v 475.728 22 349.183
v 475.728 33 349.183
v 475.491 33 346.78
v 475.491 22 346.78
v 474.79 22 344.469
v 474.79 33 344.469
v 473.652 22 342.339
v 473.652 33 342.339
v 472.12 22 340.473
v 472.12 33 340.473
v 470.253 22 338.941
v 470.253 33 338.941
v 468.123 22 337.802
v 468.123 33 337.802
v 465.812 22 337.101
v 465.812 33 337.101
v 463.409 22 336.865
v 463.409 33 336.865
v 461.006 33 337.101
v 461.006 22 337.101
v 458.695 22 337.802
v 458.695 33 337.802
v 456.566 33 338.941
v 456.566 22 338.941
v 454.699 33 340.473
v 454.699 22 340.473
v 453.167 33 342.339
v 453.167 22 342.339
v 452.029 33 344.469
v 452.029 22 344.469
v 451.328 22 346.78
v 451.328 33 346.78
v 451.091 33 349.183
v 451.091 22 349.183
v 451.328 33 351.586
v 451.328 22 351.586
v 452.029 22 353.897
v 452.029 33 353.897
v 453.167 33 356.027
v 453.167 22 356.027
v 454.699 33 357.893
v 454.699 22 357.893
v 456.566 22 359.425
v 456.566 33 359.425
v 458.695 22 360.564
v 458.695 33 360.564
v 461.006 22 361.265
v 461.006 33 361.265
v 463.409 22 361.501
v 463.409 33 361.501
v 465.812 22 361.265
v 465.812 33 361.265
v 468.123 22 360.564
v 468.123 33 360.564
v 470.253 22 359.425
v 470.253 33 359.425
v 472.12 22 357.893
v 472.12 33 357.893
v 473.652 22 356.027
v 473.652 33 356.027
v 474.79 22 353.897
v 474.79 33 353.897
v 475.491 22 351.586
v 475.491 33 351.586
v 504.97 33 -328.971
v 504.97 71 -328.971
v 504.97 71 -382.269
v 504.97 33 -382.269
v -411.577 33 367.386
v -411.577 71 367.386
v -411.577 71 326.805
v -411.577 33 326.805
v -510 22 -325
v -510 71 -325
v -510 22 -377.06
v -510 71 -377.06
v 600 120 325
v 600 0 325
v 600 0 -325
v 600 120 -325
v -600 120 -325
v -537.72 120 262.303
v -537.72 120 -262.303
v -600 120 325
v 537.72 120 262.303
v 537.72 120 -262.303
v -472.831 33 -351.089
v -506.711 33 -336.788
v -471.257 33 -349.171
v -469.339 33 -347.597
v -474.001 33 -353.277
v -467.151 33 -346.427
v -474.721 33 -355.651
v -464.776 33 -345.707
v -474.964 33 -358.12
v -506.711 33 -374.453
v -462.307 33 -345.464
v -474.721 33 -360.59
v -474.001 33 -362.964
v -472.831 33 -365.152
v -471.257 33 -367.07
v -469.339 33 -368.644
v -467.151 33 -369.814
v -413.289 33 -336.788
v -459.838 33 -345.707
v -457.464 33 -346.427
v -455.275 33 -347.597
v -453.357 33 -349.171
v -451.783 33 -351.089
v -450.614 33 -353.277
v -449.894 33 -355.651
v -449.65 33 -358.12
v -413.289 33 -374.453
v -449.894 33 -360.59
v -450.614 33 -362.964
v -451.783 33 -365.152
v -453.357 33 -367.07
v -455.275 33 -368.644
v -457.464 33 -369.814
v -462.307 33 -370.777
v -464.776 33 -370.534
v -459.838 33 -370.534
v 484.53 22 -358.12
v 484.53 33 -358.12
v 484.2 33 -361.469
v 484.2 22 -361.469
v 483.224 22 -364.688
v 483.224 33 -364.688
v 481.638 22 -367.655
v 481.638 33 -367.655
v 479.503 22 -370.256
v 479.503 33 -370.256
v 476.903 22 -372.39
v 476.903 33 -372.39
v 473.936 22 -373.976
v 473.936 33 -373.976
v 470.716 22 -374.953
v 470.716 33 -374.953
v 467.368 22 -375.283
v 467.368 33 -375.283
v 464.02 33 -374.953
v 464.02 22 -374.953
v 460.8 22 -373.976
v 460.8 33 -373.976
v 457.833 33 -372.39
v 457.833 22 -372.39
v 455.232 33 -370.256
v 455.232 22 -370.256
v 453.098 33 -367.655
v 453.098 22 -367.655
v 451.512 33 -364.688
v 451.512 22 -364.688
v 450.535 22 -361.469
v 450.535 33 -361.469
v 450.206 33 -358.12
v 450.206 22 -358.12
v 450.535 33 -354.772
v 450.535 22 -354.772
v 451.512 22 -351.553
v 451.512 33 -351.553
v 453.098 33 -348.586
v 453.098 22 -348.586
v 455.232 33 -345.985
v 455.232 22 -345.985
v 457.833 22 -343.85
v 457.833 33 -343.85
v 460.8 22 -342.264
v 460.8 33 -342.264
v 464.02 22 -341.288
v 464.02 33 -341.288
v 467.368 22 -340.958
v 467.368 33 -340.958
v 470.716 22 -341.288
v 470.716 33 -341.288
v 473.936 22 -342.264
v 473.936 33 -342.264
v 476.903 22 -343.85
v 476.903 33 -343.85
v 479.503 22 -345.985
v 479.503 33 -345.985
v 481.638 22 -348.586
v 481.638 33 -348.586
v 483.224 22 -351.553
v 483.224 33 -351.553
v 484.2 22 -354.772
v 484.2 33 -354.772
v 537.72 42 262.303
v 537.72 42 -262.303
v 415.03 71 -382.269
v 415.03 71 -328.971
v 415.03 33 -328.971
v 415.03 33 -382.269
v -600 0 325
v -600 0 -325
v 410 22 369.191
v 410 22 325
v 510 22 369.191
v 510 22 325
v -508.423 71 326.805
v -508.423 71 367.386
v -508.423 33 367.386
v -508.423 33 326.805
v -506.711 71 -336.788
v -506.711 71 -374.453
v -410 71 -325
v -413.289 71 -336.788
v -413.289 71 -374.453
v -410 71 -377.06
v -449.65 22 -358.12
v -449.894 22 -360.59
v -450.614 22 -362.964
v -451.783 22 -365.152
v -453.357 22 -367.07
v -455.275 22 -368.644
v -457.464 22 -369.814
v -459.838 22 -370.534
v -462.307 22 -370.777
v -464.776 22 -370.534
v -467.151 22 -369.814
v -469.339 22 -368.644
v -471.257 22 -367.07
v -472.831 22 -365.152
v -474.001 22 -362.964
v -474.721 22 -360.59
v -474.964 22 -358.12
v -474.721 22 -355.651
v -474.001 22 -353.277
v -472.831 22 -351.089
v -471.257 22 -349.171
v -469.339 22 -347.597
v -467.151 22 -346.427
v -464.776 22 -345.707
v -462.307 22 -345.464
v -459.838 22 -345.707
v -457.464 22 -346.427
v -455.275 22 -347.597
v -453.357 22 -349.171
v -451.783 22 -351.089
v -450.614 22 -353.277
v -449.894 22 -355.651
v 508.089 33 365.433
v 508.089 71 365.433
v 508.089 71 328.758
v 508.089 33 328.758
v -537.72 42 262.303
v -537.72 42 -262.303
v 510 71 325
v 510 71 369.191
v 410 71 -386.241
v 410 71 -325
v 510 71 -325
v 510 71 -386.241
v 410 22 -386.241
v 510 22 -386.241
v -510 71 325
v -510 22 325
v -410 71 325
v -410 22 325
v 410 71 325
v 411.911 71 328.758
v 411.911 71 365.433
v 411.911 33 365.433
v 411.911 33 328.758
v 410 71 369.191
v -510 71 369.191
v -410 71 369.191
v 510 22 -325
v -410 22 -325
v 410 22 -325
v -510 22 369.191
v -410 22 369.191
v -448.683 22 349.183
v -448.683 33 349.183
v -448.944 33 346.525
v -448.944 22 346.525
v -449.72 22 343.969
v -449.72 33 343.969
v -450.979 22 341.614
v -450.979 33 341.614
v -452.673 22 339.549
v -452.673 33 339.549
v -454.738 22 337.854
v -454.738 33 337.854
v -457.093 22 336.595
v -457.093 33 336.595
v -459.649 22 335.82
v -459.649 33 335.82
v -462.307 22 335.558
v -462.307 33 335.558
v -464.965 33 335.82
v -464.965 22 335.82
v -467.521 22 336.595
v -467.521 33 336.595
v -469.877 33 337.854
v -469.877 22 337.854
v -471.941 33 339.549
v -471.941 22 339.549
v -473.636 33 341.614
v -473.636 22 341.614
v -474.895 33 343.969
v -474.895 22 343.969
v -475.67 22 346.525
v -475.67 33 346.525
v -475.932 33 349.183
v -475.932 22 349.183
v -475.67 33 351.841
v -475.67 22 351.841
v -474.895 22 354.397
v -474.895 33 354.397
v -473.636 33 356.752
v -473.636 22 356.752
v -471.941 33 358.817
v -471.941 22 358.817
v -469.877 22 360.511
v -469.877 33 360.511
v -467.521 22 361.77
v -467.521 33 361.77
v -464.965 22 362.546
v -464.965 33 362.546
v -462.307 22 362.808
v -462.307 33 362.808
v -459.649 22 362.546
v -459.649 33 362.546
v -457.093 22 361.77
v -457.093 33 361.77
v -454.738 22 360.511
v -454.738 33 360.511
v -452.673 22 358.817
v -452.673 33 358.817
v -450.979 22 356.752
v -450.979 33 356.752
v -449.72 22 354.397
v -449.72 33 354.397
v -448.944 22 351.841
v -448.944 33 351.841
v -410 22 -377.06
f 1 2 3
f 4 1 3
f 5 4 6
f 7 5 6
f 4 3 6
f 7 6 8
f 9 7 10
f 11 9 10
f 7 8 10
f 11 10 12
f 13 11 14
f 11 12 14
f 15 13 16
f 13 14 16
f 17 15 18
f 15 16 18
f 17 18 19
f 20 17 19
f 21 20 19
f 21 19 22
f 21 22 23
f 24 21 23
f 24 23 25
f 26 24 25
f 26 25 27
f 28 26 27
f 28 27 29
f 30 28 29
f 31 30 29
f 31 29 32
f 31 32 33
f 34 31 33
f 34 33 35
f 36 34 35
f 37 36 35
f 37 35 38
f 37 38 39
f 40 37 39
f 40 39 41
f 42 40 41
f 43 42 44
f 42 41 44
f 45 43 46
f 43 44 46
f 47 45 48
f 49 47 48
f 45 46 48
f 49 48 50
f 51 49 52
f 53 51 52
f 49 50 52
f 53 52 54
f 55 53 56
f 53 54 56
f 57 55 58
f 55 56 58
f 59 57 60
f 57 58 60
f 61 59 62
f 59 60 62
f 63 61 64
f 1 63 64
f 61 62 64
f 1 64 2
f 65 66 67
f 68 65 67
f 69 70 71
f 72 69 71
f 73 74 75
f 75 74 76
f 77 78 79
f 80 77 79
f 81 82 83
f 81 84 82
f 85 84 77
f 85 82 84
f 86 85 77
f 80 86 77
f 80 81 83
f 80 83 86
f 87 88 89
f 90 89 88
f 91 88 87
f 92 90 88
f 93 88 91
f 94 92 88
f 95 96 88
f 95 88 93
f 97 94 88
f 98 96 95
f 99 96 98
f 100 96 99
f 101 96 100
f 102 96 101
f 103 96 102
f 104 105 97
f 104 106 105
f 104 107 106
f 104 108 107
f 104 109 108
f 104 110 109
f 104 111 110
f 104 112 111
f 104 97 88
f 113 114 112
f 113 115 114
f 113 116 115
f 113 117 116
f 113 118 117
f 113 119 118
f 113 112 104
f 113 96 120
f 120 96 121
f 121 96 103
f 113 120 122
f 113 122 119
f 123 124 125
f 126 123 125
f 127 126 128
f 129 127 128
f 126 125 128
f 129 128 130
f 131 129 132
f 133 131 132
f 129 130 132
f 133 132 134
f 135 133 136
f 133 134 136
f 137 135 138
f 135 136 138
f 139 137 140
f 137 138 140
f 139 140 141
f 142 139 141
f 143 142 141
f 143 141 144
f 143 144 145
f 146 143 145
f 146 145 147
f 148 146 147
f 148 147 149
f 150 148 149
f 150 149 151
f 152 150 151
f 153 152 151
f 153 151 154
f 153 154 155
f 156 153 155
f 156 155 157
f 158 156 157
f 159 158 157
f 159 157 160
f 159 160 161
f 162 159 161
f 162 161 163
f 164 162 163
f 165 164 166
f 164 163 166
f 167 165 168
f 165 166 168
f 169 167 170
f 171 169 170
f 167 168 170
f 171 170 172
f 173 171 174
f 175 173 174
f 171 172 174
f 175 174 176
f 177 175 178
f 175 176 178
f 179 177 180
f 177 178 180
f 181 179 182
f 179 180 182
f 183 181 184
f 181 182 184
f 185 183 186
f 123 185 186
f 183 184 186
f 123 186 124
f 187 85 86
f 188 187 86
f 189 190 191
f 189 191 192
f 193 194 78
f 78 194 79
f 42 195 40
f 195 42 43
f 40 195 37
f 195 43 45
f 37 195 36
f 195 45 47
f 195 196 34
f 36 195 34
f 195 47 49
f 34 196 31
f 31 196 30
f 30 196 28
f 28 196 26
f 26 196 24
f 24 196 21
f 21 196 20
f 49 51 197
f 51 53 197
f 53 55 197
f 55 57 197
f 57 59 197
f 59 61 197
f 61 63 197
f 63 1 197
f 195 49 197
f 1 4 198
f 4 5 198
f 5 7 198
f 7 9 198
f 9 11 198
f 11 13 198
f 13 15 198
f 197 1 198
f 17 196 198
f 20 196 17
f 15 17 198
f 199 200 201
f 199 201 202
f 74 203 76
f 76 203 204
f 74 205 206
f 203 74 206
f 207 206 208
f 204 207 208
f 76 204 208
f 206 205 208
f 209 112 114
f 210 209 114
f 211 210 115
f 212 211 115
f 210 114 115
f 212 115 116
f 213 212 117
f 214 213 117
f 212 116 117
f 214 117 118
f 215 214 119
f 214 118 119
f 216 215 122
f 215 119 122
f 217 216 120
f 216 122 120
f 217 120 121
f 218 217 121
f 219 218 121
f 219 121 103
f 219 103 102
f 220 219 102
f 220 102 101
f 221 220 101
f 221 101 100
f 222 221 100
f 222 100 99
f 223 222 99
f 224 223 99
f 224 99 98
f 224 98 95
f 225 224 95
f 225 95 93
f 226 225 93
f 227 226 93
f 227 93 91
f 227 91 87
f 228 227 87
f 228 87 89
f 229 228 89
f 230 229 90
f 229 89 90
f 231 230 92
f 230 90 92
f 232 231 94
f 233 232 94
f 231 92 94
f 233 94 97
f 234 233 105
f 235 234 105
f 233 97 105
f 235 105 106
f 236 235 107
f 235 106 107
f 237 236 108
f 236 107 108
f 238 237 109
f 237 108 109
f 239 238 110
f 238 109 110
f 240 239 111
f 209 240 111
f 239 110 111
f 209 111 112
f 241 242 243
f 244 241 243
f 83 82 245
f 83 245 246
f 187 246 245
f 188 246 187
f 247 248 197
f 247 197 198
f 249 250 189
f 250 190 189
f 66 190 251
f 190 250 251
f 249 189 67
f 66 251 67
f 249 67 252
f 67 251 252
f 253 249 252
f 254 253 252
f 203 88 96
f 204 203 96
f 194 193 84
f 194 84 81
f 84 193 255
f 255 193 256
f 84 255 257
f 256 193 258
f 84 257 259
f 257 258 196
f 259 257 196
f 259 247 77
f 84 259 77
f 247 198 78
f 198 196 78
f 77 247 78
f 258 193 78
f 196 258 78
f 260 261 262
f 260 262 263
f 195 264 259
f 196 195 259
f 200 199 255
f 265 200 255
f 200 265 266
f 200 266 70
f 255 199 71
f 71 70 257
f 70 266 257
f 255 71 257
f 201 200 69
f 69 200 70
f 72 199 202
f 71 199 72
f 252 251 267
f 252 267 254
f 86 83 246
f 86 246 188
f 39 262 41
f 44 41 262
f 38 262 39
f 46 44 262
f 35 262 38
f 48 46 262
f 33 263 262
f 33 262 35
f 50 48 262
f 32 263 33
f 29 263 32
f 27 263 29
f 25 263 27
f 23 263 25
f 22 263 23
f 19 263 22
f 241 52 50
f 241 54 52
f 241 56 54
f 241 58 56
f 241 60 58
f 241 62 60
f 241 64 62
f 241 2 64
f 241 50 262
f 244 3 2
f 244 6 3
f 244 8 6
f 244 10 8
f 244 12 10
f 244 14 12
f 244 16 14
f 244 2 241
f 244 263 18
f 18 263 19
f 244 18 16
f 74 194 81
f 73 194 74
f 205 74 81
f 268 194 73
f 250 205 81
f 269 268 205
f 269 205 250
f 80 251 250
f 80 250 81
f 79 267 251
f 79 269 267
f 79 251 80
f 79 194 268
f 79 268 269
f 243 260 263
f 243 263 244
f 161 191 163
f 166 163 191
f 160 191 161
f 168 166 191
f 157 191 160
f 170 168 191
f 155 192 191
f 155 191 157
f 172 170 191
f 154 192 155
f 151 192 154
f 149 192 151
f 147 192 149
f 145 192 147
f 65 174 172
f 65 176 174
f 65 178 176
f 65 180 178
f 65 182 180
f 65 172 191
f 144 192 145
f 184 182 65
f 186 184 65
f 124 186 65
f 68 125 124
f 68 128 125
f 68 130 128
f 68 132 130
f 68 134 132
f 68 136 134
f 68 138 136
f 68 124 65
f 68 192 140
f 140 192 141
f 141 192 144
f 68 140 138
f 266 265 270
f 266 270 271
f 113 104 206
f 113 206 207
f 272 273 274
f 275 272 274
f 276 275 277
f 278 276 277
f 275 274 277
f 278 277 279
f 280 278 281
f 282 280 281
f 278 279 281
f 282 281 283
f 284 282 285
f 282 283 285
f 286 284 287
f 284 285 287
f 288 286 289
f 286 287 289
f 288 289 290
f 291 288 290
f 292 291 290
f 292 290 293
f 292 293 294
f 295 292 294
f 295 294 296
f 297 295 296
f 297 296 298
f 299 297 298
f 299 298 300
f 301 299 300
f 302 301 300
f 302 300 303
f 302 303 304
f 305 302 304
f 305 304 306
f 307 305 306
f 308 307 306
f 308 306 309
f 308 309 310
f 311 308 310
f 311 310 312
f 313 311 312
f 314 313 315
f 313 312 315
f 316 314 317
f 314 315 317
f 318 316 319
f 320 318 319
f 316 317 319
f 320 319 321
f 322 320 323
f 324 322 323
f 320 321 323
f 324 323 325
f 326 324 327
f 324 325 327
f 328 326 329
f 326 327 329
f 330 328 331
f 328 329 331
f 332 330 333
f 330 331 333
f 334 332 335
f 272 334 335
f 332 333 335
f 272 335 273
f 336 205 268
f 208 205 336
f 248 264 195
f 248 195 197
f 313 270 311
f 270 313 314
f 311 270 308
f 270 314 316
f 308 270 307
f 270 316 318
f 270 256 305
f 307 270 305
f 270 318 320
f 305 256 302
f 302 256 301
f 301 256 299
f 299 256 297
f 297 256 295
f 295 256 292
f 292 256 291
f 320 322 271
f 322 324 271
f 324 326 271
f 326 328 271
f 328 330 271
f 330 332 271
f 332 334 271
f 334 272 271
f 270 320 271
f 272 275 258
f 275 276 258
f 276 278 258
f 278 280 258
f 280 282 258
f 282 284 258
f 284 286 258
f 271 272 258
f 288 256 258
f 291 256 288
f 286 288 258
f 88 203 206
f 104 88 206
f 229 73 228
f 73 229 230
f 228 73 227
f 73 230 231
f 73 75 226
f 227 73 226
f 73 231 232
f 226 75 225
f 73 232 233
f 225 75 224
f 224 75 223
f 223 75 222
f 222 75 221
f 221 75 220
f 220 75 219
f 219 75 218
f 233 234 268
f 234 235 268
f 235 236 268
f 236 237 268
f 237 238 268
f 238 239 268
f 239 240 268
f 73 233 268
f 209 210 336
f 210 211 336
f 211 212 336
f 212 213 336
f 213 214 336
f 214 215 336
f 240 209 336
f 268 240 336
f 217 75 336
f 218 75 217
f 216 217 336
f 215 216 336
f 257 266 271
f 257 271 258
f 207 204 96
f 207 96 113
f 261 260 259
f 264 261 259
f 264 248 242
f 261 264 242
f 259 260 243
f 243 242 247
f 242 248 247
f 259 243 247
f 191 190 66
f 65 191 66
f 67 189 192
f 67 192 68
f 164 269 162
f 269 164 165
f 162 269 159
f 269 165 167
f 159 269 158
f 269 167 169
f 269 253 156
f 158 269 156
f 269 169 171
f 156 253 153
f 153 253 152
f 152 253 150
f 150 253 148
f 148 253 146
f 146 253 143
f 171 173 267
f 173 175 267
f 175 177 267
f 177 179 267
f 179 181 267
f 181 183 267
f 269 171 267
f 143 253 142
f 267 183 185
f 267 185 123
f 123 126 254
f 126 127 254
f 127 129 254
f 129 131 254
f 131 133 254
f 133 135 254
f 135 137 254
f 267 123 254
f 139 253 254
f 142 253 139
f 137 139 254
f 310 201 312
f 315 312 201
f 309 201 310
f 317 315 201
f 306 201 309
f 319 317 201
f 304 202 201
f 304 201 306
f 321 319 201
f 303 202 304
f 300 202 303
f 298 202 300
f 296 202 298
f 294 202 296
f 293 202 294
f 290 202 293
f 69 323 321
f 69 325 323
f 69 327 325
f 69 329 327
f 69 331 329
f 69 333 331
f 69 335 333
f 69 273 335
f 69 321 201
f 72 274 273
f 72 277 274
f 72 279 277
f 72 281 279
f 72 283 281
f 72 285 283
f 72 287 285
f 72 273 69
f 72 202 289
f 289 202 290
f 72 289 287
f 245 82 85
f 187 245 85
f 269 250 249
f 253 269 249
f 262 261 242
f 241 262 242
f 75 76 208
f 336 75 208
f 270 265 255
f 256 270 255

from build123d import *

# Parameters (mm, degrees)
SKETCH1_W                = 1200
SKETCH1_H                = 650
BOSS_EXTRUDE1_DEPTH      = 120
SKETCH6_W                = 1075.440948148
SKETCH6_H                = 524.60534056
CUT_EXTRUDE5_DEPTH       = 78
SKETCH2_W                = 100
SKETCH2_H                = 61.240681987
SKETCH2_H_2              = 52.060088527
SKETCH2_H_3              = 44.191008419
BOSS_EXTRUDE3_DEPTH      = 98
SKETCH7_W                = 44.191008419
SKETCH7_H                = 49
CUT_EXTRUDE6_DEPTH       = 91
CUT_EXTRUDE6_DEPTH_BACK  = 1111
SKETCH8_W                = 61.240681987
SKETCH8_H                = 49
CUT_EXTRUDE7_DEPTH       = 91
CUT_EXTRUDE7_DEPTH_BACK  = 1111
SKETCH10_W               = 96.846541068
SKETCH10_H               = 40.58098524
SKETCH10_W_2             = 96.178240502
SKETCH10_H_2             = 36.675881957
SKETCH10_W_3             = 89.939369206
SKETCH10_H_3             = 53.297884326
SKETCH10_W_4             = 93.422548206
SKETCH10_H_4             = 37.665233543
CUT_EXTRUDE9_DEPTH       = 38
SKETCH11_R               = 12.656806897
SKETCH11_R_2             = 13.624607795
SKETCH11_R_3             = 12.31829203
SKETCH11_R_4             = 17.162338859
CUT_EXTRUDE10_DEPTH      = 88
CUT_EXTRUDE10_DEPTH_BACK = 34


with BuildPart() as part:
    # Sketch1 → Boss-Extrude1 (new body)
    with BuildSketch(Plane(origin=(0, 0, 0), x_dir=(1, 0, 0), z_dir=(0, 1, 0))):
        Rectangle(SKETCH1_W, SKETCH1_H)
    extrude(amount=BOSS_EXTRUDE1_DEPTH)

    # Sketch6 → Cut-Extrude5 (cut)
    with BuildSketch(Plane(origin=(0, 120, 0), x_dir=(1, 0, 0), z_dir=(0, 1, 0))):
        Rectangle(SKETCH6_W, SKETCH6_H)
    extrude(amount=-CUT_EXTRUDE5_DEPTH, mode=Mode.SUBTRACT)

    # Sketch2 → Boss-Extrude3 (add)
    with BuildSketch(Plane(origin=(0, 120, 0), x_dir=(1, 0, 0), z_dir=(0, 1, 0))):
        with Locations((460, 355.620340994)):
            Rectangle(SKETCH2_W, SKETCH2_H)
        with Locations((-460, 351.030044264)):
            Rectangle(SKETCH2_W, SKETCH2_H_2)
        with Locations((-460, -347.09550421)):
            Rectangle(SKETCH2_W, SKETCH2_H_3)
        with Locations((460, -347.09550421)):
            Rectangle(SKETCH2_W, SKETCH2_H_3)
    extrude(amount=-BOSS_EXTRUDE3_DEPTH)

    # Sketch7 → Cut-Extrude6 (cut, two sides)
    with BuildSketch(Plane(origin=(510, 0, 0), x_dir=(0, 0, -1), z_dir=(1, 0, 0))) as cut_extrude6_sk:
        with Locations((-347.09550421, 95.5)):
            Rectangle(SKETCH7_W, SKETCH7_H)
    extrude(amount=CUT_EXTRUDE6_DEPTH, mode=Mode.SUBTRACT)
    extrude(cut_extrude6_sk.sketch, amount=-CUT_EXTRUDE6_DEPTH_BACK, mode=Mode.SUBTRACT)

    # Sketch8 → Cut-Extrude7 (cut, two sides)
    with BuildSketch(Plane(origin=(510, 0, 0), x_dir=(0, 0, -1), z_dir=(1, 0, 0))) as cut_extrude7_sk:
        with Locations((355.620340994, 95.5)):
            Rectangle(SKETCH8_W, SKETCH8_H)
    extrude(amount=CUT_EXTRUDE7_DEPTH, mode=Mode.SUBTRACT)
    extrude(cut_extrude7_sk.sketch, amount=-CUT_EXTRUDE7_DEPTH_BACK, mode=Mode.SUBTRACT)

    # Sketch10 → Cut-Extrude9 (cut)
    with BuildSketch(Plane(origin=(0, 71, 0), x_dir=(1, 0, 0), z_dir=(0, 1, 0))):
        with Locations((-460, -347.095504209)):
            Rectangle(SKETCH10_W, SKETCH10_H)
        with Locations((460, -347.09550421)):
            Rectangle(SKETCH10_W_2, SKETCH10_H_2)
        with Locations((460, 355.620340993)):
            Rectangle(SKETCH10_W_3, SKETCH10_H_3)
        with Locations((-460, 355.620340994)):
            Rectangle(SKETCH10_W_4, SKETCH10_H_4)
    extrude(amount=-CUT_EXTRUDE9_DEPTH, mode=Mode.SUBTRACT)

    # Sketch11 → Cut-Extrude10 (cut, two sides)
    with BuildSketch(Plane(origin=(0, 33, 0), x_dir=(1, 0, 0), z_dir=(0, 1, 0))) as cut_extrude10_sk:
        with Locations((-462.307183801, 358.120386365)):
            Circle(SKETCH11_R)
        with Locations((-462.307183801, -349.182945784)):
            Circle(SKETCH11_R_2)
        with Locations((463.409280552, -349.182945784)):
            Circle(SKETCH11_R_3)
        with Locations((467.367852557, 358.120386365)):
            Circle(SKETCH11_R_4)
    extrude(amount=CUT_EXTRUDE10_DEPTH, mode=Mode.SUBTRACT)
    extrude(cut_extrude10_sk.sketch, amount=-CUT_EXTRUDE10_DEPTH_BACK, mode=Mode.SUBTRACT)


solid = part.part
